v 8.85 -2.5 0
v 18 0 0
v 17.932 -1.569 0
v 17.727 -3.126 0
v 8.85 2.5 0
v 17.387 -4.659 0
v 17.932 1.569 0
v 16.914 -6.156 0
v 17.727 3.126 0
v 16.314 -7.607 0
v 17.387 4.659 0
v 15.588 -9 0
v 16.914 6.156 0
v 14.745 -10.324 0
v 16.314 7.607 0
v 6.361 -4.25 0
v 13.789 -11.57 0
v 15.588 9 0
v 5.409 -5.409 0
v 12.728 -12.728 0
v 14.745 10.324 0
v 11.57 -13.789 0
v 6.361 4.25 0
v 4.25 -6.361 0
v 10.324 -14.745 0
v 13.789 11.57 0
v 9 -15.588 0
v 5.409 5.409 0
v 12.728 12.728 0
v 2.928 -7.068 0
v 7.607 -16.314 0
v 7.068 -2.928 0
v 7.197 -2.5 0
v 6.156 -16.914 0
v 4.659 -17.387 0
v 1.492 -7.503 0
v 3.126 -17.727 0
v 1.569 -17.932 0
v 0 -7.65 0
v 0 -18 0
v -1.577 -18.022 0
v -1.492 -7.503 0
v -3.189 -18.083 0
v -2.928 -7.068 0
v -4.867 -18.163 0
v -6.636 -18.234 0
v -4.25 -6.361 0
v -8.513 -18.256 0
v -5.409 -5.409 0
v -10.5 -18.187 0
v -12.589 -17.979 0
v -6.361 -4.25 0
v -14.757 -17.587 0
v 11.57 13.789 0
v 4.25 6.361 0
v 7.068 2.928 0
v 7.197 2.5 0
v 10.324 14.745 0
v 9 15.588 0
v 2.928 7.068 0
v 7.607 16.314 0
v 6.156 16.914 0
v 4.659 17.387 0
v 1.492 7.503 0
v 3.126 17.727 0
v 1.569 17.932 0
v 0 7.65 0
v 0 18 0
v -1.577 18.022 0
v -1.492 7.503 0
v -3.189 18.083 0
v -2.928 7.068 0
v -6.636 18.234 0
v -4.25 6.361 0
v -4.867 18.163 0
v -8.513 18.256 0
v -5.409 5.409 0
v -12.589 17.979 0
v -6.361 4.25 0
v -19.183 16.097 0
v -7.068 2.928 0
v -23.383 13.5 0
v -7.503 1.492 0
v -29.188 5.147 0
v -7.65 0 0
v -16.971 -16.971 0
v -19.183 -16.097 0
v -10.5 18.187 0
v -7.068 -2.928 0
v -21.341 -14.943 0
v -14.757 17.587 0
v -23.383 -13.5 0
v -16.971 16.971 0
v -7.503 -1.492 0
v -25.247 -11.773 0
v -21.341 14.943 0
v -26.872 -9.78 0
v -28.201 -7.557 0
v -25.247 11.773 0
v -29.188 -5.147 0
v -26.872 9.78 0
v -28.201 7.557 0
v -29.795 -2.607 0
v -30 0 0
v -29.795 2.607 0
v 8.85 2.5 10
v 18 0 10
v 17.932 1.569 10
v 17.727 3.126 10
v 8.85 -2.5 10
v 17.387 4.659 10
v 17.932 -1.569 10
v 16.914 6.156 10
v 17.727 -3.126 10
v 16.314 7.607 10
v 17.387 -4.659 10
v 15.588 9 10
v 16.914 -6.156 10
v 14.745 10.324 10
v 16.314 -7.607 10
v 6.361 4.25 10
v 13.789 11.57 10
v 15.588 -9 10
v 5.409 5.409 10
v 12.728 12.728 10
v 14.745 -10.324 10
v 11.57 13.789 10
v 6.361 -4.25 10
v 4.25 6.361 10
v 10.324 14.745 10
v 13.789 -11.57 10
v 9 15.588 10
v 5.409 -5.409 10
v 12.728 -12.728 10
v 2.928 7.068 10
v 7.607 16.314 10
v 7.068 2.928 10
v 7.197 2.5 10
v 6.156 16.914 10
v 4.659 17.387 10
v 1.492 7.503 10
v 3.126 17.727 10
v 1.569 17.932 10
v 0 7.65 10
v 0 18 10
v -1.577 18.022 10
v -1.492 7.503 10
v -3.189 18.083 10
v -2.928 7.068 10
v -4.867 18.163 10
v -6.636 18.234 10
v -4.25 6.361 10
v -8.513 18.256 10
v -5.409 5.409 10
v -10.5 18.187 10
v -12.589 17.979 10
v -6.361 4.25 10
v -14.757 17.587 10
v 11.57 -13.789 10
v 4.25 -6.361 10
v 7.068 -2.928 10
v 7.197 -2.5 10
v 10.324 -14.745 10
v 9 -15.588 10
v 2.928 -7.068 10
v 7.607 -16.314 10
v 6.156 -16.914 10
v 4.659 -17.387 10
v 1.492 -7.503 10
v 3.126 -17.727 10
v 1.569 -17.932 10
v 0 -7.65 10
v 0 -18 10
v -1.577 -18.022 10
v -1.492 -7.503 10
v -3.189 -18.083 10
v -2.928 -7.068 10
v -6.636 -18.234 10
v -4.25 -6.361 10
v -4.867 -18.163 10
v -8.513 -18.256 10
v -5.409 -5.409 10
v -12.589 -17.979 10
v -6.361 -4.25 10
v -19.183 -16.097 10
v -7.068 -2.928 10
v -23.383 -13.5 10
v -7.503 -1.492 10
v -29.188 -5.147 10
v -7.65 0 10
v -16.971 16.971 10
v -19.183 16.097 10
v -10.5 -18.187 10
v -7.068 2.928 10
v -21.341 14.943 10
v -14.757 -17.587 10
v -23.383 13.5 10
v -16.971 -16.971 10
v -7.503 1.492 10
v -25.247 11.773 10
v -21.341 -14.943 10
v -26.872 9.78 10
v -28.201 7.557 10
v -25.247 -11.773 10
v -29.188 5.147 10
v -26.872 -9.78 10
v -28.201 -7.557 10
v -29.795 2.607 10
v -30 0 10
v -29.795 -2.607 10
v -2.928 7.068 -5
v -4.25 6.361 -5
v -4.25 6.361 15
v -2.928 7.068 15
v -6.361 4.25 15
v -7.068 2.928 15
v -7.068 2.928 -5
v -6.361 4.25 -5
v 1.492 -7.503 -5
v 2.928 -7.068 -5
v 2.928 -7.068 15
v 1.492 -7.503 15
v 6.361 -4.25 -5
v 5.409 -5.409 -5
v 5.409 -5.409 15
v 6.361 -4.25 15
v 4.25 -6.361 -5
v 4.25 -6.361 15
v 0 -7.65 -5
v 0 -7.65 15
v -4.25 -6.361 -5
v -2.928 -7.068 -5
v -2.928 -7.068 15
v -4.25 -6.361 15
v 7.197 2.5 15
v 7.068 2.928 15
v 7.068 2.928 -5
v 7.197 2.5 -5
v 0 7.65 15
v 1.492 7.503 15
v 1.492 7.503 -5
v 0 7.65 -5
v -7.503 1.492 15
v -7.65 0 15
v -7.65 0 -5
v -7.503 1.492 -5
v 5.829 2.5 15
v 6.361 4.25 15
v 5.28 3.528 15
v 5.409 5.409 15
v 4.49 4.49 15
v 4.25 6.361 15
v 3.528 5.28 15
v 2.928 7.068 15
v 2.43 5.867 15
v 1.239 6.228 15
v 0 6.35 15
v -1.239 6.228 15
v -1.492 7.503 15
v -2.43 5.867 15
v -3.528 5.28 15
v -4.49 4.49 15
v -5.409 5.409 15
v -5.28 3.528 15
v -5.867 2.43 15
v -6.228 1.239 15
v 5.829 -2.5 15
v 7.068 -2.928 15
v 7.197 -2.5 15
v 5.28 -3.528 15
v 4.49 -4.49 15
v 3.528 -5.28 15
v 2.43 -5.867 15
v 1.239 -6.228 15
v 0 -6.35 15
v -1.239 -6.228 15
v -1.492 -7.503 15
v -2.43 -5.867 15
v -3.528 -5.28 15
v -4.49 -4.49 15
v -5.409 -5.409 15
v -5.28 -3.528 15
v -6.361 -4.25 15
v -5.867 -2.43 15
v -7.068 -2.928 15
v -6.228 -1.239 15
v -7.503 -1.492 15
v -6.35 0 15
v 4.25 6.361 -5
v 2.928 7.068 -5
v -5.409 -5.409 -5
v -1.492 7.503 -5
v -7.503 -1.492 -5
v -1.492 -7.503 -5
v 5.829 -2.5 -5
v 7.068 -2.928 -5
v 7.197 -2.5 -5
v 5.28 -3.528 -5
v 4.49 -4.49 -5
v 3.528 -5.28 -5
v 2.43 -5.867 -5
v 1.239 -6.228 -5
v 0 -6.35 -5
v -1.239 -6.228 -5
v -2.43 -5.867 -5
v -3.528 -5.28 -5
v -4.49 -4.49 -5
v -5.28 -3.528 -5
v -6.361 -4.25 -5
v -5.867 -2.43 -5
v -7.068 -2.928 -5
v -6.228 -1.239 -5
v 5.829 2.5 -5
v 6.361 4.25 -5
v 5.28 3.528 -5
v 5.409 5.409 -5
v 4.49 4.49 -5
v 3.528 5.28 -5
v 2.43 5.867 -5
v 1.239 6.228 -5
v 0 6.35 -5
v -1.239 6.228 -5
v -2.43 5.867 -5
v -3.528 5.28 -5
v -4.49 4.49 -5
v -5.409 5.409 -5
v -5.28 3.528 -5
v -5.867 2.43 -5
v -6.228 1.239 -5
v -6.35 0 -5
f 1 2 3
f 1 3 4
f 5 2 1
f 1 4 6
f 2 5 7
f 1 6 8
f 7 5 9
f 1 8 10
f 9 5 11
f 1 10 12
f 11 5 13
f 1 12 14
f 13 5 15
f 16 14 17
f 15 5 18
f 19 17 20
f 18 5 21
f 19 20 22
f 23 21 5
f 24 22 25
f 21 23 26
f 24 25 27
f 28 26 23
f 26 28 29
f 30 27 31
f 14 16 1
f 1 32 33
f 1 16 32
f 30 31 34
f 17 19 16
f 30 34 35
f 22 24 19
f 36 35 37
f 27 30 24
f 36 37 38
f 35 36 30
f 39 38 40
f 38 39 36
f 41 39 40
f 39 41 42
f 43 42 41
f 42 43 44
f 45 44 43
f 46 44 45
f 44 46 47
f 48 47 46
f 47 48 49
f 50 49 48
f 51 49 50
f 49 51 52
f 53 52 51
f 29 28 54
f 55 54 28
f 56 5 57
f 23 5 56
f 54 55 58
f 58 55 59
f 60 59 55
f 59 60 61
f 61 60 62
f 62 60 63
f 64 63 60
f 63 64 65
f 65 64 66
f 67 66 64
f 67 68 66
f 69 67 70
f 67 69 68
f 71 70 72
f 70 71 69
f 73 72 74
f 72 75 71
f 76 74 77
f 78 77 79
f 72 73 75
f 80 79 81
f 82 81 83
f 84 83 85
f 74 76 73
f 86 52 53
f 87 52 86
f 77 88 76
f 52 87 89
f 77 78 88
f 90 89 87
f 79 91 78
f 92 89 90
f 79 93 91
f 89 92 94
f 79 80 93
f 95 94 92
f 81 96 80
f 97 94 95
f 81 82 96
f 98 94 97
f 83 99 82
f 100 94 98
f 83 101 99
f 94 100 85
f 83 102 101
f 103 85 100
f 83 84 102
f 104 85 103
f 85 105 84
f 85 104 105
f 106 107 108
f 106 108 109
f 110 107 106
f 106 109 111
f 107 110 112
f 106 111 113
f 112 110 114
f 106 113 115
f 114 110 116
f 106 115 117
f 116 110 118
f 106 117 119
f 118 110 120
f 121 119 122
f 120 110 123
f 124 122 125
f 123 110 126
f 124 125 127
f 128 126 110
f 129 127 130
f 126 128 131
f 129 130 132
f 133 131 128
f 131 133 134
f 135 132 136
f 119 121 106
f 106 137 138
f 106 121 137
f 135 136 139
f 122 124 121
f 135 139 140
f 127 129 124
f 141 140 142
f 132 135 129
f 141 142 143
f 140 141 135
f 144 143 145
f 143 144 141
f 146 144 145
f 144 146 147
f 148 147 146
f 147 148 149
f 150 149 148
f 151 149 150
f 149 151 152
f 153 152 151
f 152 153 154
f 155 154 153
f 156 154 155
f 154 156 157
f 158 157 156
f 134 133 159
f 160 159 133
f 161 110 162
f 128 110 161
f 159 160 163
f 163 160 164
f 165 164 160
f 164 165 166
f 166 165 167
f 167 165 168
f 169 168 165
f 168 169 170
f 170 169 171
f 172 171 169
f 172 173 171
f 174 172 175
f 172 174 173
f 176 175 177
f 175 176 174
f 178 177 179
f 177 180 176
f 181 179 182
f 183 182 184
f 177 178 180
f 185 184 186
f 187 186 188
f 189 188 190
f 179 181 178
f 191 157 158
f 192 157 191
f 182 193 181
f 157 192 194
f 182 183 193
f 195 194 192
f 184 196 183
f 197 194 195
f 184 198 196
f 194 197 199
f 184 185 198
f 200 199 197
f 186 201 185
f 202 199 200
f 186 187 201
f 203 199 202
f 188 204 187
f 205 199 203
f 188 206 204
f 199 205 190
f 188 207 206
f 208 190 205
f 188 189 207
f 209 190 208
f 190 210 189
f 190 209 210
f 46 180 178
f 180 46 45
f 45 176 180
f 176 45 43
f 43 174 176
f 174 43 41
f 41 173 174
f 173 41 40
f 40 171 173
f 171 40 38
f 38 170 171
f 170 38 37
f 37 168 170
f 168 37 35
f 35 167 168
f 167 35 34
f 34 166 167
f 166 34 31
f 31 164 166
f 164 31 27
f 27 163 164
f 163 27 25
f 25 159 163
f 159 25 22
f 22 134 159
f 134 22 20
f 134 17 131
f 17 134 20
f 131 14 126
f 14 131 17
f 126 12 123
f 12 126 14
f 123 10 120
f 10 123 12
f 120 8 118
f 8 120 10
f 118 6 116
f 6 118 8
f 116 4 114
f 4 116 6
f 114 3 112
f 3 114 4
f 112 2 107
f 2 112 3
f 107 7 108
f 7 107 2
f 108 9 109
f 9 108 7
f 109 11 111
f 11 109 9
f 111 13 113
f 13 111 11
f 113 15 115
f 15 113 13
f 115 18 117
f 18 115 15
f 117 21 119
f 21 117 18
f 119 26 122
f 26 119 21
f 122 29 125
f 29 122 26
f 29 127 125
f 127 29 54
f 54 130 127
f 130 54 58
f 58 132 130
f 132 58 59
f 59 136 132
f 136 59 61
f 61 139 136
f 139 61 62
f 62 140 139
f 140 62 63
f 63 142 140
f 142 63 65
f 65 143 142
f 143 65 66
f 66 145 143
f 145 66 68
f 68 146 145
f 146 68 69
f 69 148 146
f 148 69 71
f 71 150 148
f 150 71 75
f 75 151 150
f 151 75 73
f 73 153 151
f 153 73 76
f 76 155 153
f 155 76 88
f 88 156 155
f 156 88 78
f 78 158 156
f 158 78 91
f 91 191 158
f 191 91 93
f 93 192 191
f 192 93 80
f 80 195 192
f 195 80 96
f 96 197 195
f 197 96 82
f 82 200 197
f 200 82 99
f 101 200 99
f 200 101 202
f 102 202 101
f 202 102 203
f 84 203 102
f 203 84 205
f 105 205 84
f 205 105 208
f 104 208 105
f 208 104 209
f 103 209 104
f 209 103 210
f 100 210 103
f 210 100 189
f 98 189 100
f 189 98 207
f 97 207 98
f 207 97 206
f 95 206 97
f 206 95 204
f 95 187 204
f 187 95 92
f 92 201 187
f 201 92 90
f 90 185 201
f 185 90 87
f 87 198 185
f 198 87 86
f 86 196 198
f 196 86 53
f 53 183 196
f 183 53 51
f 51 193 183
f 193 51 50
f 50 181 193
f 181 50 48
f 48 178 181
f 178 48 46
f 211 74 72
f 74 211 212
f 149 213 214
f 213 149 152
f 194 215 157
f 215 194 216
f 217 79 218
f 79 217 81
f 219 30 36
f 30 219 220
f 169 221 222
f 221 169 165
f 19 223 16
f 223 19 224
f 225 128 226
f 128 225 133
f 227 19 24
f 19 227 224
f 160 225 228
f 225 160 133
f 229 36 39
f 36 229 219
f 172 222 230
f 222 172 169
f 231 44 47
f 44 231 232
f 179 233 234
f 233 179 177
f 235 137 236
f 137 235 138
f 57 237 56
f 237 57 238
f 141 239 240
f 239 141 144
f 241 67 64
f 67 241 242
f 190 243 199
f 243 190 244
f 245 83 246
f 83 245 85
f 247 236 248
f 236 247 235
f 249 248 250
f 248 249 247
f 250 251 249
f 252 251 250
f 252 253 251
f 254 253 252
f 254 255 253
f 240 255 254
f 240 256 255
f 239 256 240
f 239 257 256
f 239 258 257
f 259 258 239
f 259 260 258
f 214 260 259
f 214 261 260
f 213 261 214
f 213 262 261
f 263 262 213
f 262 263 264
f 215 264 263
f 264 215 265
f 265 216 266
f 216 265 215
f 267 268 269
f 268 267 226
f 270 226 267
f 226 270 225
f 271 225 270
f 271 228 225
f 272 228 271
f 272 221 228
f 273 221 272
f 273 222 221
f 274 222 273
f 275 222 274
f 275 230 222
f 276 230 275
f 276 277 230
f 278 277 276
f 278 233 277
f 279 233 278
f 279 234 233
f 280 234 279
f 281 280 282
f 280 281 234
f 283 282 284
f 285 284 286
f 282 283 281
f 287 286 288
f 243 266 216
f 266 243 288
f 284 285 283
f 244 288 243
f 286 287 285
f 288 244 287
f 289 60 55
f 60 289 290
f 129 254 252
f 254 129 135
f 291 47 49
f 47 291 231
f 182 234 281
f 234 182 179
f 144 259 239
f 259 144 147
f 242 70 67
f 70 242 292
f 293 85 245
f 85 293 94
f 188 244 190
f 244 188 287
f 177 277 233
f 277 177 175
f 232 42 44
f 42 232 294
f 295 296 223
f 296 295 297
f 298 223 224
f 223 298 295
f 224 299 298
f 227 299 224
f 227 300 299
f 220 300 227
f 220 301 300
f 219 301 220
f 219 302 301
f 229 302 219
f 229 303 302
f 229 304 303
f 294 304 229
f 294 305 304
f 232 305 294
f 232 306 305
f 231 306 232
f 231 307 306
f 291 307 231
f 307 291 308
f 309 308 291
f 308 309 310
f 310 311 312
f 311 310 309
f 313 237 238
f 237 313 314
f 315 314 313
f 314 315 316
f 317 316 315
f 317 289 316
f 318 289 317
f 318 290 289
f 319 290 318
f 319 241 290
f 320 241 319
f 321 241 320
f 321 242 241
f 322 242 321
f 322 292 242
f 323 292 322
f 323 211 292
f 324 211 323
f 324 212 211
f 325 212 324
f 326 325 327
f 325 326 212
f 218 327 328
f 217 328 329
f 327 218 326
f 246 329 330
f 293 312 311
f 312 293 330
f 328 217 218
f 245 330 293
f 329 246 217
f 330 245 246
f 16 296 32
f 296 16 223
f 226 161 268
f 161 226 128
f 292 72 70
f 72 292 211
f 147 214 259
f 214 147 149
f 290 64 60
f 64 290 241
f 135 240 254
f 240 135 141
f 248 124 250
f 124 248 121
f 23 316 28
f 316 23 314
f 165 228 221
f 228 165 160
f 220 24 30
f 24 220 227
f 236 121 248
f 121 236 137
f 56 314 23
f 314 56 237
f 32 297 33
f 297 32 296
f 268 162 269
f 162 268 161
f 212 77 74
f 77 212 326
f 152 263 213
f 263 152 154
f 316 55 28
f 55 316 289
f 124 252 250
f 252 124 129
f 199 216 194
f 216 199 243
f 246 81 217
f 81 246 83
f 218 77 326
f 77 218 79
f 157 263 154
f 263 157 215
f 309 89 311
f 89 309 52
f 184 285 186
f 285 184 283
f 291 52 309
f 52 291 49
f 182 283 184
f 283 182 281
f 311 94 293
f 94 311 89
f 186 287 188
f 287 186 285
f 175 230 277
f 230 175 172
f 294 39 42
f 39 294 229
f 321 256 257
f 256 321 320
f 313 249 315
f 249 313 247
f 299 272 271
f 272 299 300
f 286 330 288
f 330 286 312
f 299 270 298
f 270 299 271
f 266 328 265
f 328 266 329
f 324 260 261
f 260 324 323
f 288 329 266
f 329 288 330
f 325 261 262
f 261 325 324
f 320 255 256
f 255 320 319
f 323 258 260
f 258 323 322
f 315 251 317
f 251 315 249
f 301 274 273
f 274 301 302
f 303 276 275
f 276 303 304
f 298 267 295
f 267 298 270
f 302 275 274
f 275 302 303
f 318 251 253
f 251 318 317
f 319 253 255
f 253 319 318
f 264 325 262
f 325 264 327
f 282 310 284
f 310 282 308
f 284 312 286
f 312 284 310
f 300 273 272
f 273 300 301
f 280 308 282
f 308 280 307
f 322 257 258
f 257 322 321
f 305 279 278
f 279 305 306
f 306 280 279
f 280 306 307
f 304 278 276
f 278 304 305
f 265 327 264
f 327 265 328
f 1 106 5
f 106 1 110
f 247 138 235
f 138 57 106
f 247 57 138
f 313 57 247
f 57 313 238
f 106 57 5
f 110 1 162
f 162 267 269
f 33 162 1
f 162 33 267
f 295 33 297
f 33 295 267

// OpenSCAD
$fn = 32;

// ----------------------------------------------------------------------
// Cam: base radius 18 mm with a 12 mm lift over 180 degrees
// ----------------------------------------------------------------------

// --- parameters (mm) ---
base_r = 18;              // base radius
lift = 12;                // lift height above the base radius
lift_span = 180;          // angular width of the lift
lift_start = 90;          // angle where the lift starts
cam_t = 10;               // cam plate thickness
hub_d = 15.3;             // hub diameter
hub_h = 20;               // hub height
bore_d = 12.7;            // bore
key_w = 5;                // keyway width
key_depth = 1.6;          // keyway depth

cam_profile = [[18, 0], [17.932, 1.569], [17.727, 3.126], [17.387, 4.659], [16.914, 6.156], [16.314, 7.607], [15.588, 9], [14.745, 10.324], [13.789, 11.57], [12.728, 12.728], [11.57, 13.789], [10.324, 14.745], [9, 15.588], [7.607, 16.314], [6.156, 16.914], [4.659, 17.387], [3.126, 17.727], [1.569, 17.932], [0, 18], [-1.577, 18.022], [-3.189, 18.083], [-4.867, 18.163], [-6.636, 18.234], [-8.513, 18.256], [-10.5, 18.187], [-12.589, 17.979], [-14.757, 17.587], [-16.971, 16.971], [-19.183, 16.097], [-21.341, 14.943], [-23.383, 13.5], [-25.247, 11.773], [-26.872, 9.78], [-28.201, 7.557], [-29.188, 5.147], [-29.795, 2.607], [-30, 0], [-29.795, -2.607], [-29.188, -5.147], [-28.201, -7.557], [-26.872, -9.78], [-25.247, -11.773], [-23.383, -13.5], [-21.341, -14.943], [-19.183, -16.097], [-16.971, -16.971], [-14.757, -17.587], [-12.589, -17.979], [-10.5, -18.187], [-8.513, -18.256], [-6.636, -18.234], [-4.867, -18.163], [-3.189, -18.083], [-1.577, -18.022], [0, -18], [1.569, -17.932], [3.126, -17.727], [4.659, -17.387], [6.156, -16.914], [7.607, -16.314], [9, -15.588], [10.324, -14.745], [11.57, -13.789], [12.728, -12.728], [13.789, -11.57], [14.745, -10.324], [15.588, -9], [16.314, -7.607], [16.914, -6.156], [17.387, -4.659], [17.727, -3.126], [17.932, -1.569]];

difference() {
  union() {
    linear_extrude(height = cam_t) polygon(cam_profile);
    /* hub, proud of the cam plate on both sides */
    translate([0, 0, -5]) cylinder(h = hub_h, d = hub_d);
  }
  /* bore through the hub, 2.5 mm clear on both faces */
  translate([0, 0, -7.5]) cylinder(h = hub_h + 5, d = bore_d);
  /* keyway, milled through the whole hub */
  translate([4.75, -2.5, -7.5]) cube([4.1, 5, 25]);
}
